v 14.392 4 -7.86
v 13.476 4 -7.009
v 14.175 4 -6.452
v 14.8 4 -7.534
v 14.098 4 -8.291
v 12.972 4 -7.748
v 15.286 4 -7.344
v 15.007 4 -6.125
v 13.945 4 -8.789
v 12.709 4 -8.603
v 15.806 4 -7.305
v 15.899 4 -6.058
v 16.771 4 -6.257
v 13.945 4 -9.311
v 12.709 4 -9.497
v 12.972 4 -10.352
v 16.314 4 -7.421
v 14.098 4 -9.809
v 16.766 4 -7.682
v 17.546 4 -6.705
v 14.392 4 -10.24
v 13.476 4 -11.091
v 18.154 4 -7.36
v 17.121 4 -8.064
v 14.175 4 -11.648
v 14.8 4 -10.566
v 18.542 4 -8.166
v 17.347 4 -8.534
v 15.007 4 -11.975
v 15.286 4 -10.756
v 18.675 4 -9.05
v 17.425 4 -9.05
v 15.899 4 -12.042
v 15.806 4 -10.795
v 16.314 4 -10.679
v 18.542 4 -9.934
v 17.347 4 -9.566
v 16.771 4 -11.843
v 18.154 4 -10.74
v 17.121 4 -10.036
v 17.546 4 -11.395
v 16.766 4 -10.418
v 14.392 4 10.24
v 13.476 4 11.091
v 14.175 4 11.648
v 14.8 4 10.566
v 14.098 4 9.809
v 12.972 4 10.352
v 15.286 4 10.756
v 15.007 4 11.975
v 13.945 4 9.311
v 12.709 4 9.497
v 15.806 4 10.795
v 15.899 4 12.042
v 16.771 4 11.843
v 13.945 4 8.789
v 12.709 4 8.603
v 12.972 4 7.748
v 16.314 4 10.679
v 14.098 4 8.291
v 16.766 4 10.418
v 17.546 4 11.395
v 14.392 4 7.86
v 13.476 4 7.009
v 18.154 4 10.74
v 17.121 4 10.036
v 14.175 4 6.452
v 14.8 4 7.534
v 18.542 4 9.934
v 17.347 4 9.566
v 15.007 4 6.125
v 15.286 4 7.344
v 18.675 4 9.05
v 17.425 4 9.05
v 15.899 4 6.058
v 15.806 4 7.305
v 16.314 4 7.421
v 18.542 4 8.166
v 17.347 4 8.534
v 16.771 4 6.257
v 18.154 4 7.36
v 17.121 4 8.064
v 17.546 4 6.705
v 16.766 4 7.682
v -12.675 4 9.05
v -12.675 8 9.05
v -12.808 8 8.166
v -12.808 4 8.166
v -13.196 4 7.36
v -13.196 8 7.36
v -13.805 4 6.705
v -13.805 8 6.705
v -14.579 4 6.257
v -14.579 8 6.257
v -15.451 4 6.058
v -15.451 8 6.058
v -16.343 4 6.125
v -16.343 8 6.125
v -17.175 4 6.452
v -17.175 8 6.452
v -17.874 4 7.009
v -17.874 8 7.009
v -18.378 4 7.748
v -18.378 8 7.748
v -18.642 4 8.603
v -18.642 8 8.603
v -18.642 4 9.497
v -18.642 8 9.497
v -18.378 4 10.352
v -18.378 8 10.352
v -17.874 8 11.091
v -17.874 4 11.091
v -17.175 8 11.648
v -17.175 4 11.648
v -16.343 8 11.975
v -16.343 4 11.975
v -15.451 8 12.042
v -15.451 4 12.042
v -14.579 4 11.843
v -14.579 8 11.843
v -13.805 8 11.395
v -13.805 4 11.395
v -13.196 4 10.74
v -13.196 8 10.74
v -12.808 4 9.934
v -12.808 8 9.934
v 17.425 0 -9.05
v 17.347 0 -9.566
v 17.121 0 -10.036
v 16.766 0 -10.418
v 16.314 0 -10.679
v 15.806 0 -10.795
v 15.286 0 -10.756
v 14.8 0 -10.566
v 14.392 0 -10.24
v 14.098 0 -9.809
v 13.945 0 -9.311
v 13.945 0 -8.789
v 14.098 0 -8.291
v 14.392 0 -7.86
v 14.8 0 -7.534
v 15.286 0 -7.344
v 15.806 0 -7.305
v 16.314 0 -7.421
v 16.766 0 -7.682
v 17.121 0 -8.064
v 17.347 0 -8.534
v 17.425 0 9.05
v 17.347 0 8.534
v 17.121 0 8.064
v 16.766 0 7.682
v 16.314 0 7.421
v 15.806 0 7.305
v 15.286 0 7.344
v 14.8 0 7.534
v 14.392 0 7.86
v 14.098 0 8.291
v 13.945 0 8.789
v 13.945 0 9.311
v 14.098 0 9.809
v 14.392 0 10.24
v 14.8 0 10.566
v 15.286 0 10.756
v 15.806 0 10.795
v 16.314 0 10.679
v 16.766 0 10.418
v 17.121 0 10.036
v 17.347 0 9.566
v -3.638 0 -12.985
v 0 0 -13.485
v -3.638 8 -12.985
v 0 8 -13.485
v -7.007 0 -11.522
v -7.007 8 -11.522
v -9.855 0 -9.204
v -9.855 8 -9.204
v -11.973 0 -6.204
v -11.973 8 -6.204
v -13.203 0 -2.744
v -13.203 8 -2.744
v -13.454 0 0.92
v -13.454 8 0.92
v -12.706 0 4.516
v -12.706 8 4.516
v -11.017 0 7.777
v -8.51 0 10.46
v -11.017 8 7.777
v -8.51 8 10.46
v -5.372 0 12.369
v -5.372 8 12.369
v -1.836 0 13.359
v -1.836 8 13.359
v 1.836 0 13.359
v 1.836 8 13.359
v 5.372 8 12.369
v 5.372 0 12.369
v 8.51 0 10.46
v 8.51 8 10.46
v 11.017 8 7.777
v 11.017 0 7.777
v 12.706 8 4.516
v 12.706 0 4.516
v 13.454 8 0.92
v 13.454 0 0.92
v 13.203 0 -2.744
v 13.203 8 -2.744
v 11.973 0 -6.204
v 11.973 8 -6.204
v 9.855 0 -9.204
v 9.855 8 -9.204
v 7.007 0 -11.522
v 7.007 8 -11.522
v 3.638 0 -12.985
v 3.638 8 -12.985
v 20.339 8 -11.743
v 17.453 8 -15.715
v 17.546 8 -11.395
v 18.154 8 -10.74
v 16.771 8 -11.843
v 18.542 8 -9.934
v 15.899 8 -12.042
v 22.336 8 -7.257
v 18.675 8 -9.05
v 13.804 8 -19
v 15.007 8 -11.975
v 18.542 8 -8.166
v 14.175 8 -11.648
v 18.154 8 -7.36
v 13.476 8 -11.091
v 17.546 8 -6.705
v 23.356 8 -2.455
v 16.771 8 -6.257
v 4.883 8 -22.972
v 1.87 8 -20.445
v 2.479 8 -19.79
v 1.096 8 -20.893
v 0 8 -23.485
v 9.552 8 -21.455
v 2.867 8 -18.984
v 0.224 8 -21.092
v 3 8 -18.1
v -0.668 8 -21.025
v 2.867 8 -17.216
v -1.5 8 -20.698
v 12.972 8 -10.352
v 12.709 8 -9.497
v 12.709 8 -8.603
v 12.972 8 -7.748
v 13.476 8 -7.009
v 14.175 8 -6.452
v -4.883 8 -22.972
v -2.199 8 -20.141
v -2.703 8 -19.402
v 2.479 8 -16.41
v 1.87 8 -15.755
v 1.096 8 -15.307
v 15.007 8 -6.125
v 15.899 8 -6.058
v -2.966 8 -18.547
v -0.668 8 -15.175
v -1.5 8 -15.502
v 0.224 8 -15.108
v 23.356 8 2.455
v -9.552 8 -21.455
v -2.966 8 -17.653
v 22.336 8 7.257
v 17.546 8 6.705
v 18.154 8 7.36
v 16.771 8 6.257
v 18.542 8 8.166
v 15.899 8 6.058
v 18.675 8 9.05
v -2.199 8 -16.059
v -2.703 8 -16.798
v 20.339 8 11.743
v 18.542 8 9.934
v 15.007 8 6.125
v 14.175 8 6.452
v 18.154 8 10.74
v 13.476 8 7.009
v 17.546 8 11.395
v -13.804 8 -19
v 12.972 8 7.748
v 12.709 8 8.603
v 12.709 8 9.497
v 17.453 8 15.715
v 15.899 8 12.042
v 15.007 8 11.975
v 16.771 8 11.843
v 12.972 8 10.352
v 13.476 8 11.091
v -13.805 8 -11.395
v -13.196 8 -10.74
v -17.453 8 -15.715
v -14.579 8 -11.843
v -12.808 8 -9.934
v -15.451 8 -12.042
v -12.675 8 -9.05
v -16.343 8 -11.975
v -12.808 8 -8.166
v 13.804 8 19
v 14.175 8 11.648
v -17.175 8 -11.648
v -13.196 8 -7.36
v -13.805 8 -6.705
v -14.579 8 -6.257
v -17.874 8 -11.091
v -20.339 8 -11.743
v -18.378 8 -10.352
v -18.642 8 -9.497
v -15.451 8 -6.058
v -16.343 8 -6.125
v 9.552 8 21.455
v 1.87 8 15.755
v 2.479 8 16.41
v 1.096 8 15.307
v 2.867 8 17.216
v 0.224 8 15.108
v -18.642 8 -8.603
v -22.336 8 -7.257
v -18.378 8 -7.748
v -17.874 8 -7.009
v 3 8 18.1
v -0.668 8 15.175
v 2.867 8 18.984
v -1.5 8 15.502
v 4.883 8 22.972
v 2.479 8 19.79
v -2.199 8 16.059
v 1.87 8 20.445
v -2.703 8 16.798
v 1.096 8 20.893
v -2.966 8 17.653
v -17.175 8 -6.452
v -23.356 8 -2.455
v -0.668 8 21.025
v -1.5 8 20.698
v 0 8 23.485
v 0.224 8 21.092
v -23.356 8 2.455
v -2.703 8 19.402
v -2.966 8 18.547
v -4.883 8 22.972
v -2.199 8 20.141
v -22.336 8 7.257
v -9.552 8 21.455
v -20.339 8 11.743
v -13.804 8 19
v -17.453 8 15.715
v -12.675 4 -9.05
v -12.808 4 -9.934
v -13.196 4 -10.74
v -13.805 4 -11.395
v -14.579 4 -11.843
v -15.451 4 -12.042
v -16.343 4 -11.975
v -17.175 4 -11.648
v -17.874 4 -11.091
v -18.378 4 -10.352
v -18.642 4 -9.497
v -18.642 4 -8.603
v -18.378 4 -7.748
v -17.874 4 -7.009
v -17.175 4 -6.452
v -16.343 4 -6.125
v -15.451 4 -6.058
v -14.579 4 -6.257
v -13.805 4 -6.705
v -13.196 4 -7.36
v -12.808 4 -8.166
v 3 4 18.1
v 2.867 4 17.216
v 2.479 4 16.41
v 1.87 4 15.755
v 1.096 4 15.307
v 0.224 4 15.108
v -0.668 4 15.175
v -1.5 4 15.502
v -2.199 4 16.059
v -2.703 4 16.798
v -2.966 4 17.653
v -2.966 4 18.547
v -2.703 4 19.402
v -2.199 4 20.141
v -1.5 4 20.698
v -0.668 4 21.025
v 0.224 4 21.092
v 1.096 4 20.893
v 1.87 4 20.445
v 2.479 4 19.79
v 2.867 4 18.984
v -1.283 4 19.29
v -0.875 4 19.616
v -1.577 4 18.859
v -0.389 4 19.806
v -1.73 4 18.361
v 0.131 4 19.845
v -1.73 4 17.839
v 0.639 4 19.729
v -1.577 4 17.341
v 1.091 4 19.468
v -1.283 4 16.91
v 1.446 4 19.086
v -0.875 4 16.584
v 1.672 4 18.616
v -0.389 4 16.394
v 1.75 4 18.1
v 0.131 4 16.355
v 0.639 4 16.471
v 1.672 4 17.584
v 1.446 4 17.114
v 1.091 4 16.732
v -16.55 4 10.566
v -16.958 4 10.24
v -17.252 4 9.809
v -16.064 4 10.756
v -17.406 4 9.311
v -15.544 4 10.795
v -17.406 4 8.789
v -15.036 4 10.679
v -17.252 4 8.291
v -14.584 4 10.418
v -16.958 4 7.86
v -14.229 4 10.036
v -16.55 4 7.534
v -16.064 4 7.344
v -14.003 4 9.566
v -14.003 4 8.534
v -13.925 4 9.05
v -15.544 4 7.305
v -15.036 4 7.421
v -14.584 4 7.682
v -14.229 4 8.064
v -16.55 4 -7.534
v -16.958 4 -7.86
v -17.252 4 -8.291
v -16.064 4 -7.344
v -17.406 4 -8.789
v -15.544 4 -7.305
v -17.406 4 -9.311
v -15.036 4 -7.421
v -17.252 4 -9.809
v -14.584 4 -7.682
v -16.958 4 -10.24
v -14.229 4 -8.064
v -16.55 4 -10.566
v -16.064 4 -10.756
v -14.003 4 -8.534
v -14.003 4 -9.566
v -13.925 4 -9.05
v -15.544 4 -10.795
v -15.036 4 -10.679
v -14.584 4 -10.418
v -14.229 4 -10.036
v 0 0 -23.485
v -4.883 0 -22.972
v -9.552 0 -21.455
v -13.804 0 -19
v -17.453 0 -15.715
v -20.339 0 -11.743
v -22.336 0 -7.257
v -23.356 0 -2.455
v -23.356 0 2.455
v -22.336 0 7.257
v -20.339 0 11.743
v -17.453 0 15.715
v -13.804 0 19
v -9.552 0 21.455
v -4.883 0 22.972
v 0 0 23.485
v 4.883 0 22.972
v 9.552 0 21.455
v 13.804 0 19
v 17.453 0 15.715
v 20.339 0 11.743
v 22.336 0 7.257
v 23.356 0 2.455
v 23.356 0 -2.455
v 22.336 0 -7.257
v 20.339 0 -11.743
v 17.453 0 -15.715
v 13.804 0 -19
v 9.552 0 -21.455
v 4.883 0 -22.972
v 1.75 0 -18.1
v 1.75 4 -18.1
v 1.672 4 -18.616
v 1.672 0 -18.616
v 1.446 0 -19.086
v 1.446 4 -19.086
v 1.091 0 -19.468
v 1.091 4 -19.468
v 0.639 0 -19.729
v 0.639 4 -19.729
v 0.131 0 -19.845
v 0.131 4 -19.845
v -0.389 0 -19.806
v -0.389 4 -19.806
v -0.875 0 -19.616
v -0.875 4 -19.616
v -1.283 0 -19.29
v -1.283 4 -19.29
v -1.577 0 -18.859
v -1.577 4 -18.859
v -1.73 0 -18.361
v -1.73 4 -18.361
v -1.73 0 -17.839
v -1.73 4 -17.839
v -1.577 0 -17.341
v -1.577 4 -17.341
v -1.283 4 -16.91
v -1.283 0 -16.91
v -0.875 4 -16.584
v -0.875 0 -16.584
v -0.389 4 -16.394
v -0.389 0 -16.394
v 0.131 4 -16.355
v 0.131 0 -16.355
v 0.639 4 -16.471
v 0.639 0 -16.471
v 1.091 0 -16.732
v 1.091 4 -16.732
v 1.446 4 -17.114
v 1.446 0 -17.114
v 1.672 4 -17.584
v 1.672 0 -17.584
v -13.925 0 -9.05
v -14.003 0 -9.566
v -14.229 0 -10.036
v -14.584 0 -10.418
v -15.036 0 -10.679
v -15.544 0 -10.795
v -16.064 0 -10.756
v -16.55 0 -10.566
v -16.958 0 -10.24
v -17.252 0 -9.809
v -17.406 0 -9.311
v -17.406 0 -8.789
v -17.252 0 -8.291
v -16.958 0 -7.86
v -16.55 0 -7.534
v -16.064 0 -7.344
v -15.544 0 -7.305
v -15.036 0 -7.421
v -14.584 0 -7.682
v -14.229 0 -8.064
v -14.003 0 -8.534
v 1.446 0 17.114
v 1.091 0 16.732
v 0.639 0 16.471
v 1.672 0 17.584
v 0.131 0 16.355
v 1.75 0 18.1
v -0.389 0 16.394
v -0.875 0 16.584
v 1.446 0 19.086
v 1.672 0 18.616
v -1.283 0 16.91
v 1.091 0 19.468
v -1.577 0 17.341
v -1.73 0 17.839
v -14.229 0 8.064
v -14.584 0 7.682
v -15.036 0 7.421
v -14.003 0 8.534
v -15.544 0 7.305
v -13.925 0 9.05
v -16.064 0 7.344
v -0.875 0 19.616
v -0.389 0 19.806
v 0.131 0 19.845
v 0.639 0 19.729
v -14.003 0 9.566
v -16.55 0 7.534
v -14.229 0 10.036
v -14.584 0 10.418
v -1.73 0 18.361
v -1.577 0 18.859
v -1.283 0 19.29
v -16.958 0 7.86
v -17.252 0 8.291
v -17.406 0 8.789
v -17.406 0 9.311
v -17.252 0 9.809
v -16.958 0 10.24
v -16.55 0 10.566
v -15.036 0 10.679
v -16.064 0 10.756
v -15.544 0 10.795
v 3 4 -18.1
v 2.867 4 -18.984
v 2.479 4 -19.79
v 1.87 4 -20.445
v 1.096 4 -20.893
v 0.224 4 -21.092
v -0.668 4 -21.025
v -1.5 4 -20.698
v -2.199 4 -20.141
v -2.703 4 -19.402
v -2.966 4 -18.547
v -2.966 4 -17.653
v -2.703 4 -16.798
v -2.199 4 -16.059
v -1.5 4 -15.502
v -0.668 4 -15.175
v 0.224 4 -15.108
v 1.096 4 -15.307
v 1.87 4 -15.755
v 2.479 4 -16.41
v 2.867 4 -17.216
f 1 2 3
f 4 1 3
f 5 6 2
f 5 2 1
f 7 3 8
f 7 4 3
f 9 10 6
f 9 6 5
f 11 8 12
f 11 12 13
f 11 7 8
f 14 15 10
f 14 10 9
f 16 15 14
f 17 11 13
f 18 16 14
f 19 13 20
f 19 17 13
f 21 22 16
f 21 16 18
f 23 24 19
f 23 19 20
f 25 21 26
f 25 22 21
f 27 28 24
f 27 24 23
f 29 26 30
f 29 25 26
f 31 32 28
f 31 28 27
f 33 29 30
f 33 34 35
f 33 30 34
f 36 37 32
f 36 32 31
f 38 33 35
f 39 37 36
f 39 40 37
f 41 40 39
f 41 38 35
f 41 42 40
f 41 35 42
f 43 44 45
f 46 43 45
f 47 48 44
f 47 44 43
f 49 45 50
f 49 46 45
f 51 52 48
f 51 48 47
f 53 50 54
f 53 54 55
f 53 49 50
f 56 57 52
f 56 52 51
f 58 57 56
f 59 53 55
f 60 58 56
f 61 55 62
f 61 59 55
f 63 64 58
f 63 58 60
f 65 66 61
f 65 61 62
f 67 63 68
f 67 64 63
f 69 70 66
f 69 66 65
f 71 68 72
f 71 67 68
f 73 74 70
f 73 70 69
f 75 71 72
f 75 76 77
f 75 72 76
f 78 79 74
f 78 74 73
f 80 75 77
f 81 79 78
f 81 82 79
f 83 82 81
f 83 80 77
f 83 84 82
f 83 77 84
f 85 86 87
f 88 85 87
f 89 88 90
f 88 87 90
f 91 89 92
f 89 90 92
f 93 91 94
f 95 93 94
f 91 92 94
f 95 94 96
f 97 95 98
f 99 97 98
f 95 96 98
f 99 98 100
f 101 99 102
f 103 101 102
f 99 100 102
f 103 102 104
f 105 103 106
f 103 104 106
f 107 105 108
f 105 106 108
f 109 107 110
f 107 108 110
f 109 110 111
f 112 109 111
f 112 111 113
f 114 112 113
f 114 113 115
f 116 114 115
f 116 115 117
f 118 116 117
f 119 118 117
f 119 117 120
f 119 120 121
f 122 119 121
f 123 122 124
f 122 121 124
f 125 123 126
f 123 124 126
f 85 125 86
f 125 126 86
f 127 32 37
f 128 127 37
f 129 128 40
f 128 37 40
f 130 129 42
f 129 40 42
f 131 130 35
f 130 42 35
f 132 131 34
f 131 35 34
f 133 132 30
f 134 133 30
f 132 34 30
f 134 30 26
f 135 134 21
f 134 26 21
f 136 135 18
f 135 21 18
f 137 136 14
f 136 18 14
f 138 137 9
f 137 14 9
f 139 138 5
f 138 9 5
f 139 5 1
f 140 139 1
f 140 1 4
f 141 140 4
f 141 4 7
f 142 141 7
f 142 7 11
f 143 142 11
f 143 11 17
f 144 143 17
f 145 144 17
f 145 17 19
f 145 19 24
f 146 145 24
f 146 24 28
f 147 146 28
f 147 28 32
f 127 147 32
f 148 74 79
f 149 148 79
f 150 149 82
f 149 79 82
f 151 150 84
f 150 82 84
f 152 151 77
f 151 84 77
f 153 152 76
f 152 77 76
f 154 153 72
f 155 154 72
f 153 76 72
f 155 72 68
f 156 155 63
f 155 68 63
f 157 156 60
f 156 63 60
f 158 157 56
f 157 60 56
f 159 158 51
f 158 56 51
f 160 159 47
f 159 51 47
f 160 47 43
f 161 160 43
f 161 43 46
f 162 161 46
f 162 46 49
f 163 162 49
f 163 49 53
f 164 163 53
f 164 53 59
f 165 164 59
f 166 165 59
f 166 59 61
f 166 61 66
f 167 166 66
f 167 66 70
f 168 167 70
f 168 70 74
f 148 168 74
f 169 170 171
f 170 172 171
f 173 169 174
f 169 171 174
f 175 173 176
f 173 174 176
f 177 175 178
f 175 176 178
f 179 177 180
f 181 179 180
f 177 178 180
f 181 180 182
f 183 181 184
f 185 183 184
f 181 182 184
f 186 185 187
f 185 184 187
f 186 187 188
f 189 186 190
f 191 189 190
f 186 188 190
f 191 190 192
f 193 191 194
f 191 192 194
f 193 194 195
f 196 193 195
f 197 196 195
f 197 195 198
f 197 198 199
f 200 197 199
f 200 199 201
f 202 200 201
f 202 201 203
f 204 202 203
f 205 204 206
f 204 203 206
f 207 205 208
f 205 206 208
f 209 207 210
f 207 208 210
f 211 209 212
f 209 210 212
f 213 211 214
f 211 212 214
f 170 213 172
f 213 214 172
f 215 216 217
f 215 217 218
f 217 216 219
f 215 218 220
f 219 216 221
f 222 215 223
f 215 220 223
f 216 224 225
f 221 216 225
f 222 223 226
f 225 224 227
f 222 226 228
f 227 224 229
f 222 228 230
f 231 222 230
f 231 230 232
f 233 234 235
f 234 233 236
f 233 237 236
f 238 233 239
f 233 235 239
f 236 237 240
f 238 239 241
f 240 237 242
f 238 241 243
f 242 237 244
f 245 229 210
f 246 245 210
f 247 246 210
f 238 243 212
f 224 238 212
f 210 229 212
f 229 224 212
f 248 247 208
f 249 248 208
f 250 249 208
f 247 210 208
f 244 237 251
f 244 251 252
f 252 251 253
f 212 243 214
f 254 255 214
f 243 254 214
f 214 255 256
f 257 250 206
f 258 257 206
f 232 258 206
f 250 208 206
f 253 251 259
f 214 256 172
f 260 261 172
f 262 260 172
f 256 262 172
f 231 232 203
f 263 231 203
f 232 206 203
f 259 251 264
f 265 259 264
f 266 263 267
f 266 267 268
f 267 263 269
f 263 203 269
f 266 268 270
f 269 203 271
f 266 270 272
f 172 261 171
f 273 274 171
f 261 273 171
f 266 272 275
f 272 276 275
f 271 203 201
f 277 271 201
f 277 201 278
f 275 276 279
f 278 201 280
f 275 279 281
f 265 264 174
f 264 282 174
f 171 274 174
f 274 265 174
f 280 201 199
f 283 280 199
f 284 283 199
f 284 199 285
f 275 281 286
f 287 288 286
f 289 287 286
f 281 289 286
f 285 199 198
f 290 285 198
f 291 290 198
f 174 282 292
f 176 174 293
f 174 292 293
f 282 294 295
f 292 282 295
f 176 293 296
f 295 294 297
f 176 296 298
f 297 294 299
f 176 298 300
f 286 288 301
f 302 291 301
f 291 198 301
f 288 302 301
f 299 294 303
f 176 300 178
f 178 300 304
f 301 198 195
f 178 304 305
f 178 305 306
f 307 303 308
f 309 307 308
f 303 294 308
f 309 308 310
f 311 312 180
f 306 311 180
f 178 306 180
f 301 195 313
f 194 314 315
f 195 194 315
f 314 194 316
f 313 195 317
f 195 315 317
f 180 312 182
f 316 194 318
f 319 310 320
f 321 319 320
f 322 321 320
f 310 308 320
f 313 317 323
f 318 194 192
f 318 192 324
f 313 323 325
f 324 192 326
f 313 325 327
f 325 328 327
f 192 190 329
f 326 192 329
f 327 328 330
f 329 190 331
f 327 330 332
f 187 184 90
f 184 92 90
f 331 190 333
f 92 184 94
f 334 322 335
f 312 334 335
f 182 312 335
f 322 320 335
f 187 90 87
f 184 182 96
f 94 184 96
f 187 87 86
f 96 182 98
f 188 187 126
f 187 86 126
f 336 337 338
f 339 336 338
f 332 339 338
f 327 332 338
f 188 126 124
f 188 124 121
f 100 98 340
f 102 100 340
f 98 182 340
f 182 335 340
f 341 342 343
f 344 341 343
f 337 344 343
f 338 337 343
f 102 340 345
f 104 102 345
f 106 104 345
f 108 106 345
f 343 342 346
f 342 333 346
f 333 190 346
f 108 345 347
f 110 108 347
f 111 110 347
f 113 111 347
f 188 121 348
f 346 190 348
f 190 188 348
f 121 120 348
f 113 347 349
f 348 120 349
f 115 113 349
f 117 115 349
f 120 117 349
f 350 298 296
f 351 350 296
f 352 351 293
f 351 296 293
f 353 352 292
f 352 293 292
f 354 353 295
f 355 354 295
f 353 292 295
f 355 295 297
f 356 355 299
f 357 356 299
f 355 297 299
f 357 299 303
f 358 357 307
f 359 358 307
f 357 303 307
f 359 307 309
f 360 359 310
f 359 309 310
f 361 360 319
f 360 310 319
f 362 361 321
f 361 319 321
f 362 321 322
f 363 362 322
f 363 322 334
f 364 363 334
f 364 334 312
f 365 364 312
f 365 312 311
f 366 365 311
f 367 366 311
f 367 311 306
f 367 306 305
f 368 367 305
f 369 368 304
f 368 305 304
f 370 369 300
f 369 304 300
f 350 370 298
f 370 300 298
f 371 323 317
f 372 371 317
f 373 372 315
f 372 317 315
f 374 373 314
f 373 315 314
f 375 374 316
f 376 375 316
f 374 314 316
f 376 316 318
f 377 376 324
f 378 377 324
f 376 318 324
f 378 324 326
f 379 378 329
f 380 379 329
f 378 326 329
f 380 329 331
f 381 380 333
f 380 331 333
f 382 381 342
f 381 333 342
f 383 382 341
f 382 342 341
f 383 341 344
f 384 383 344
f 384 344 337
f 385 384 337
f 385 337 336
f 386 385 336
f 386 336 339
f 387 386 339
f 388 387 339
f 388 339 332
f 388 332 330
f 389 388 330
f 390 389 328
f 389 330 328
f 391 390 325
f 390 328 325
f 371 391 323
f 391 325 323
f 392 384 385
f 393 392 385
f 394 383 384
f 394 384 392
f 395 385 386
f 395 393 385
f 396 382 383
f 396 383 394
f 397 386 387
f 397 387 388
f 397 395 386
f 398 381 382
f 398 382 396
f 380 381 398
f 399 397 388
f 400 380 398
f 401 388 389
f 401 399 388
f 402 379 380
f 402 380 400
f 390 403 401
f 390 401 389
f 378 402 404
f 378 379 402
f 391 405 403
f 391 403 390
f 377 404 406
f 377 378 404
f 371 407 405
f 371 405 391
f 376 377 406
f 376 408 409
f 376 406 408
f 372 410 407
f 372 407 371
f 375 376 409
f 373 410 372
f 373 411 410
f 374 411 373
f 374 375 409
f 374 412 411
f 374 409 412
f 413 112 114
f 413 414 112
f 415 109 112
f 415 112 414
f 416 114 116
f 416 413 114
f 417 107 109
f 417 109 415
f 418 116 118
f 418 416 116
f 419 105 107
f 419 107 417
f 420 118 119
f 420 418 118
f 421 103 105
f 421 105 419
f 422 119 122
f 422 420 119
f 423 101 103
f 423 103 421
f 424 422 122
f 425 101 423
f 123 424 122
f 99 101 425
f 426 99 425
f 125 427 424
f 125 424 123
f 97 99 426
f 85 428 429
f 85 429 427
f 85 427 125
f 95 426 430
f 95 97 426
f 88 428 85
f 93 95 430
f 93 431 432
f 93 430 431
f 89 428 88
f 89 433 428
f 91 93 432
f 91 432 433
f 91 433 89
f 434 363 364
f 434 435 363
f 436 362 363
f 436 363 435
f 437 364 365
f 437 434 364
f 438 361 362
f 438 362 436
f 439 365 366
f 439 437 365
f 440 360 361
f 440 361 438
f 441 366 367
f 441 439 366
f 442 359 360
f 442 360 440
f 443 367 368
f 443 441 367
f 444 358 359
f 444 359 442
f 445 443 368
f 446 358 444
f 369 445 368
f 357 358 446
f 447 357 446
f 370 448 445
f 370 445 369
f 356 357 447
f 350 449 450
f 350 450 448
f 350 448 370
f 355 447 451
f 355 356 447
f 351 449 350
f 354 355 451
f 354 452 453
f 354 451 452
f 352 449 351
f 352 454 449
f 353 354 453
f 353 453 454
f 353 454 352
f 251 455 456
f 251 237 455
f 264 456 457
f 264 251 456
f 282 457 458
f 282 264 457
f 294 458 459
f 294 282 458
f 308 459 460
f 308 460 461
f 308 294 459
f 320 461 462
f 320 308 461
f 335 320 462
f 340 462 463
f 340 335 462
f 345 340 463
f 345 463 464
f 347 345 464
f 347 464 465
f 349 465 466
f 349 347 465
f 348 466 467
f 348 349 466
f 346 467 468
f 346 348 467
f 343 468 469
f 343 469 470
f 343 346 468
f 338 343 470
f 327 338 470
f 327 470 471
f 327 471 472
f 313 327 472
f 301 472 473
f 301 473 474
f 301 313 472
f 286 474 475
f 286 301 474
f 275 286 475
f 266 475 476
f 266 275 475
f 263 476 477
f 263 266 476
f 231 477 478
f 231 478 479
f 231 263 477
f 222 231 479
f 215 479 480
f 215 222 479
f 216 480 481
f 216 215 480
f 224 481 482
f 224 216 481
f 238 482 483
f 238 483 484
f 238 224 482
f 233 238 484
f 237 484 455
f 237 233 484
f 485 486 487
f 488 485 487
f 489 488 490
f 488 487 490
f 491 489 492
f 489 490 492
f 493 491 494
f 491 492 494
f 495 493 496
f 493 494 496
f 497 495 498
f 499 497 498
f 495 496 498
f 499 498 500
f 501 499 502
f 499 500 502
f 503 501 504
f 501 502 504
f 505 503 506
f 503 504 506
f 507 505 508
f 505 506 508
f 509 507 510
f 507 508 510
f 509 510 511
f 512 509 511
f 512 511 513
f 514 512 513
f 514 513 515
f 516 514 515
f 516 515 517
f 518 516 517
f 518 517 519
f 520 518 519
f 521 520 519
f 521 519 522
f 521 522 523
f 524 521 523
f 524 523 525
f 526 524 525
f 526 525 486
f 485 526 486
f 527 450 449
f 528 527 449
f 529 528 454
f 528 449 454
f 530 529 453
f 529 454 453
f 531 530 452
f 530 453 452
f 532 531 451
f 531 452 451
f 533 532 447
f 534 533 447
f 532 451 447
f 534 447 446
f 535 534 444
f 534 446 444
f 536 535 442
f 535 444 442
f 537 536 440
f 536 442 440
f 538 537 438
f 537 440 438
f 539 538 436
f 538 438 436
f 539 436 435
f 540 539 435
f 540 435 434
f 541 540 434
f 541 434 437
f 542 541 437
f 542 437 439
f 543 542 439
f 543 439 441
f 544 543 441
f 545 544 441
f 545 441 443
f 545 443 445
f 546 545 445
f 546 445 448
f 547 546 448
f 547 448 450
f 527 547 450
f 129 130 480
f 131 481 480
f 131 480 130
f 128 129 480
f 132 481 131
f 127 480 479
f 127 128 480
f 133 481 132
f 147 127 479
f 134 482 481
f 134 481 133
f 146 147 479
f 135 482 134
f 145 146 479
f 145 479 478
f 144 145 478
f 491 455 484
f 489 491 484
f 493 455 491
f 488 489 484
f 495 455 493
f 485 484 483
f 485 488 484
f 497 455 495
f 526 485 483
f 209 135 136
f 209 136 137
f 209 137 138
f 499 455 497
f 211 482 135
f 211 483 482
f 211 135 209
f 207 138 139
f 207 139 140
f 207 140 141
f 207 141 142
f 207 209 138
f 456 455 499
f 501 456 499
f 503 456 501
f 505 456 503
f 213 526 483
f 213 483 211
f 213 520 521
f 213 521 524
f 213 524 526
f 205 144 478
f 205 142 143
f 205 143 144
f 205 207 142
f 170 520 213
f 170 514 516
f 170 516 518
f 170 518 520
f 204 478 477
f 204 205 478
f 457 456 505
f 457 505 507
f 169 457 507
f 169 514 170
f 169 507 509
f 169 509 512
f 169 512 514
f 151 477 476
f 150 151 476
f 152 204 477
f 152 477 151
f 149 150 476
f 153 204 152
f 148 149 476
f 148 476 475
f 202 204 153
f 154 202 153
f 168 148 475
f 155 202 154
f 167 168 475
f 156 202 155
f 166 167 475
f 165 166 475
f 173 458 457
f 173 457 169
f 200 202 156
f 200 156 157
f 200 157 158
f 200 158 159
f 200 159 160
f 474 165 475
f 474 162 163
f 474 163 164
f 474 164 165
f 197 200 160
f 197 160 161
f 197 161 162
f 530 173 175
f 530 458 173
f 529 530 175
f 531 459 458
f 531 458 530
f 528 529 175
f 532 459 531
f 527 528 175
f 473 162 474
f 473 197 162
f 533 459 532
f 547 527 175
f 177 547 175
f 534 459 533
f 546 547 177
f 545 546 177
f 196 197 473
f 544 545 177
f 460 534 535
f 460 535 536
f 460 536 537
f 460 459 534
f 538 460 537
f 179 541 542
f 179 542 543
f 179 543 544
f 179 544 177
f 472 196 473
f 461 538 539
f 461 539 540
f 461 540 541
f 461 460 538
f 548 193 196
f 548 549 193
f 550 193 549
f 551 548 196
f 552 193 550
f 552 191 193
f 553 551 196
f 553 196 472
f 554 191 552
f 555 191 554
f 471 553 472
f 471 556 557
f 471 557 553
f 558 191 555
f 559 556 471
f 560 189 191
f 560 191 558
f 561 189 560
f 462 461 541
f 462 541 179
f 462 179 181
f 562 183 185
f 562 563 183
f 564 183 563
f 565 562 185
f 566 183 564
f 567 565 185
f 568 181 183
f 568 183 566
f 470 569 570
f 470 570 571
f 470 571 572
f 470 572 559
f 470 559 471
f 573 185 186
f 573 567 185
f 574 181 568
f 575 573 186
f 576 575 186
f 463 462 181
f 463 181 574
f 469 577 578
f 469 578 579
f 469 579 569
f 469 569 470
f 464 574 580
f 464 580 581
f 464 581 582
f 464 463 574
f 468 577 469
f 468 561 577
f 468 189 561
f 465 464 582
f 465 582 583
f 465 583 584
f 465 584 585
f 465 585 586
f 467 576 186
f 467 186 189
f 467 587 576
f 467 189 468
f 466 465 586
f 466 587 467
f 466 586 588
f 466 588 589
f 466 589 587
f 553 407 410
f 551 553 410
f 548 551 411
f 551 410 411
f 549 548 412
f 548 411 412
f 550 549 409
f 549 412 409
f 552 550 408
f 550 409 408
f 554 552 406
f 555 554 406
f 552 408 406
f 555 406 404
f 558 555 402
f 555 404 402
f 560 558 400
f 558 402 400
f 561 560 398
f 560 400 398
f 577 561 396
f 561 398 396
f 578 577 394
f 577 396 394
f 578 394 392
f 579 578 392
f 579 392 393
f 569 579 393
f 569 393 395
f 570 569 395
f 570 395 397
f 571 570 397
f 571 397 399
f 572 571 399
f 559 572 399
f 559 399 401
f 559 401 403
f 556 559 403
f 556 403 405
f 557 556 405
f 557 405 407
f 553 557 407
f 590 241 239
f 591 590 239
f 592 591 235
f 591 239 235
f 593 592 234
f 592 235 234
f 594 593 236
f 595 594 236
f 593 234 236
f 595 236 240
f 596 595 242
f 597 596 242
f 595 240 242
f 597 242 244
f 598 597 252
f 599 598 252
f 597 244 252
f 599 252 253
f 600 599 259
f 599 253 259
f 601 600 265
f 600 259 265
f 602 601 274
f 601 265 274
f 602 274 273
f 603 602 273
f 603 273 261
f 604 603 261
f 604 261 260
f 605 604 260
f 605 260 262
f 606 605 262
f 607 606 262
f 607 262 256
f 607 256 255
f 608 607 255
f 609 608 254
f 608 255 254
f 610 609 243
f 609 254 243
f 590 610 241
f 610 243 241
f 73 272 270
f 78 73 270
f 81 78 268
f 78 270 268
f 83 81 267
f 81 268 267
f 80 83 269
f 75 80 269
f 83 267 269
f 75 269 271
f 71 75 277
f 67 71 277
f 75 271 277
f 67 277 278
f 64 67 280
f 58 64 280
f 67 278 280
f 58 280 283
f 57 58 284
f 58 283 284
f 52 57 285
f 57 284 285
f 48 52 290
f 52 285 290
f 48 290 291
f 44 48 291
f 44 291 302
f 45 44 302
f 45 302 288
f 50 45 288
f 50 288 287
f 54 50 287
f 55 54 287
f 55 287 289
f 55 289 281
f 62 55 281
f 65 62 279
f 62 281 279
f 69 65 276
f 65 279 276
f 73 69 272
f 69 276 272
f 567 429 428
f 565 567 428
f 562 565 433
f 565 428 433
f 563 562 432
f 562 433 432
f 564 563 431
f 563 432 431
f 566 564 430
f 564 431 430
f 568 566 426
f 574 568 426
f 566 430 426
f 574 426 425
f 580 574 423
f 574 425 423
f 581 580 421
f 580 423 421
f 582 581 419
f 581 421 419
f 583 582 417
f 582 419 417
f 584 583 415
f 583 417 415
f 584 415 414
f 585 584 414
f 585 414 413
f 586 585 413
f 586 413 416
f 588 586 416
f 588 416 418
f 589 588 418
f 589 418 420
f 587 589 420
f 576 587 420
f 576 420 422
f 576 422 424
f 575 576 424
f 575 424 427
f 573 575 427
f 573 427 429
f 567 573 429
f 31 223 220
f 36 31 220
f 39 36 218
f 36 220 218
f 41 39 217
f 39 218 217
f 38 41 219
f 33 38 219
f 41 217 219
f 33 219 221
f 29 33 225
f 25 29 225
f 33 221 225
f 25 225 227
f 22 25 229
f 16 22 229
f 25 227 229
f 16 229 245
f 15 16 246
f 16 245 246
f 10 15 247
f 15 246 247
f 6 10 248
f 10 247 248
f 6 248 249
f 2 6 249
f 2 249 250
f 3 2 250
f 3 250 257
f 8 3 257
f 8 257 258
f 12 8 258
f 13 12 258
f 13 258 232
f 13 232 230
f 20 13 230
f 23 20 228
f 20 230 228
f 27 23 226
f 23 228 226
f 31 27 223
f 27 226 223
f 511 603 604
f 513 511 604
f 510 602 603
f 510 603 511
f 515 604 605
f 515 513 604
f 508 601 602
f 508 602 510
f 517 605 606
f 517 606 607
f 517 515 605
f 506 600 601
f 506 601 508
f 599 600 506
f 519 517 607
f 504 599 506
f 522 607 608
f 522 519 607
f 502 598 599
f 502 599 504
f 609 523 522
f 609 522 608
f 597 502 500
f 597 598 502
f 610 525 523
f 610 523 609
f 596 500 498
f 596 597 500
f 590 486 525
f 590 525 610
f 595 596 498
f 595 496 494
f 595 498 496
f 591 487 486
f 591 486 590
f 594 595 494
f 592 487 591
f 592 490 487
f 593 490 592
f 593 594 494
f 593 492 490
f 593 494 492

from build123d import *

# Parameters (mm, degrees)
SKETCH1_W          = 10
SKETCH1_H          = 8
SKETCH2_R          = 1.75
CUT_EXTRUDE1_DEPTH = 10
SKETCH2_3_R        = 3
SKETCH2_3_R_2      = 1.75
CUT_EXTRUDE2_DEPTH = 4


with BuildPart() as part:
    # Sketch1 → Revolve1 (revolve)
    with BuildSketch(Plane(origin=(0, 0, 0), x_dir=(0, 0, -1), z_dir=(1, 0, 0))):
        with Locations((18.485, 4)):
            Rectangle(SKETCH1_W, SKETCH1_H)
    revolve(axis=Axis((0, 0, 0), (0, 1, 0)))

    # Sketch2 → Cut-Extrude1 (cut)
    with BuildSketch(Plane(origin=(0, 8, 0), x_dir=(1, 0, 0), z_dir=(0, 1, 0))):
        with Locations((0, 18.1)):
            Circle(SKETCH2_R)
        with Locations((15.675059808, 9.05)):
            Circle(SKETCH2_R)
        with Locations((15.675059808, -9.05)):
            Circle(SKETCH2_R)
        with Locations((0, -18.1)):
            Circle(SKETCH2_R)
        with Locations((-15.675059808, -9.05)):
            Circle(SKETCH2_R)
        with Locations((-15.675059808, 9.05)):
            Circle(SKETCH2_R)
    extrude(amount=-CUT_EXTRUDE1_DEPTH, mode=Mode.SUBTRACT)

    # Sketch2<3> → Cut-Extrude2 (cut)
    # profile 1 of 6: a face of its own
    with BuildSketch(Plane(origin=(0, 8, 0), x_dir=(1, 0, 0), z_dir=(0, 1, 0))):
        with Locations((0, 18.1)):
            Circle(SKETCH2_3_R)
        with Locations((0, 18.1)):
            Circle(SKETCH2_3_R_2, mode=Mode.SUBTRACT)
    # profile 2 of 6: a face of its own
    with BuildSketch(Plane(origin=(0, 8, 0), x_dir=(1, 0, 0), z_dir=(0, 1, 0))):
        with Locations((15.675059808, 9.05)):
            Circle(SKETCH2_3_R)
        with Locations((15.675059808, 9.05)):
            Circle(SKETCH2_3_R_2, mode=Mode.SUBTRACT)
    # profile 3 of 6: a face of its own
    with BuildSketch(Plane(origin=(0, 8, 0), x_dir=(1, 0, 0), z_dir=(0, 1, 0))):
        with Locations((15.675059808, -9.05)):
            Circle(SKETCH2_3_R)
        with Locations((15.675059808, -9.05)):
            Circle(SKETCH2_3_R_2, mode=Mode.SUBTRACT)
    # profile 4 of 6: a face of its own
    with BuildSketch(Plane(origin=(0, 8, 0), x_dir=(1, 0, 0), z_dir=(0, 1, 0))):
        with Locations((0, -18.1)):
            Circle(SKETCH2_3_R)
        with Locations((0, -18.1)):
            Circle(SKETCH2_3_R_2, mode=Mode.SUBTRACT)
    # profile 5 of 6: a face of its own
    with BuildSketch(Plane(origin=(0, 8, 0), x_dir=(1, 0, 0), z_dir=(0, 1, 0))):
        with Locations((-15.675059808, -9.05)):
            Circle(SKETCH2_3_R)
        with Locations((-15.675059808, -9.05)):
            Circle(SKETCH2_3_R_2, mode=Mode.SUBTRACT)
    # profile 6 of 6: a face of its own
    with BuildSketch(Plane(origin=(0, 8, 0), x_dir=(1, 0, 0), z_dir=(0, 1, 0))):
        with Locations((-15.675059808, 9.05)):
            Circle(SKETCH2_3_R)
        with Locations((-15.675059808, 9.05)):
            Circle(SKETCH2_3_R_2, mode=Mode.SUBTRACT)
    extrude(amount=-CUT_EXTRUDE2_DEPTH, mode=Mode.SUBTRACT)


solid = part.part
